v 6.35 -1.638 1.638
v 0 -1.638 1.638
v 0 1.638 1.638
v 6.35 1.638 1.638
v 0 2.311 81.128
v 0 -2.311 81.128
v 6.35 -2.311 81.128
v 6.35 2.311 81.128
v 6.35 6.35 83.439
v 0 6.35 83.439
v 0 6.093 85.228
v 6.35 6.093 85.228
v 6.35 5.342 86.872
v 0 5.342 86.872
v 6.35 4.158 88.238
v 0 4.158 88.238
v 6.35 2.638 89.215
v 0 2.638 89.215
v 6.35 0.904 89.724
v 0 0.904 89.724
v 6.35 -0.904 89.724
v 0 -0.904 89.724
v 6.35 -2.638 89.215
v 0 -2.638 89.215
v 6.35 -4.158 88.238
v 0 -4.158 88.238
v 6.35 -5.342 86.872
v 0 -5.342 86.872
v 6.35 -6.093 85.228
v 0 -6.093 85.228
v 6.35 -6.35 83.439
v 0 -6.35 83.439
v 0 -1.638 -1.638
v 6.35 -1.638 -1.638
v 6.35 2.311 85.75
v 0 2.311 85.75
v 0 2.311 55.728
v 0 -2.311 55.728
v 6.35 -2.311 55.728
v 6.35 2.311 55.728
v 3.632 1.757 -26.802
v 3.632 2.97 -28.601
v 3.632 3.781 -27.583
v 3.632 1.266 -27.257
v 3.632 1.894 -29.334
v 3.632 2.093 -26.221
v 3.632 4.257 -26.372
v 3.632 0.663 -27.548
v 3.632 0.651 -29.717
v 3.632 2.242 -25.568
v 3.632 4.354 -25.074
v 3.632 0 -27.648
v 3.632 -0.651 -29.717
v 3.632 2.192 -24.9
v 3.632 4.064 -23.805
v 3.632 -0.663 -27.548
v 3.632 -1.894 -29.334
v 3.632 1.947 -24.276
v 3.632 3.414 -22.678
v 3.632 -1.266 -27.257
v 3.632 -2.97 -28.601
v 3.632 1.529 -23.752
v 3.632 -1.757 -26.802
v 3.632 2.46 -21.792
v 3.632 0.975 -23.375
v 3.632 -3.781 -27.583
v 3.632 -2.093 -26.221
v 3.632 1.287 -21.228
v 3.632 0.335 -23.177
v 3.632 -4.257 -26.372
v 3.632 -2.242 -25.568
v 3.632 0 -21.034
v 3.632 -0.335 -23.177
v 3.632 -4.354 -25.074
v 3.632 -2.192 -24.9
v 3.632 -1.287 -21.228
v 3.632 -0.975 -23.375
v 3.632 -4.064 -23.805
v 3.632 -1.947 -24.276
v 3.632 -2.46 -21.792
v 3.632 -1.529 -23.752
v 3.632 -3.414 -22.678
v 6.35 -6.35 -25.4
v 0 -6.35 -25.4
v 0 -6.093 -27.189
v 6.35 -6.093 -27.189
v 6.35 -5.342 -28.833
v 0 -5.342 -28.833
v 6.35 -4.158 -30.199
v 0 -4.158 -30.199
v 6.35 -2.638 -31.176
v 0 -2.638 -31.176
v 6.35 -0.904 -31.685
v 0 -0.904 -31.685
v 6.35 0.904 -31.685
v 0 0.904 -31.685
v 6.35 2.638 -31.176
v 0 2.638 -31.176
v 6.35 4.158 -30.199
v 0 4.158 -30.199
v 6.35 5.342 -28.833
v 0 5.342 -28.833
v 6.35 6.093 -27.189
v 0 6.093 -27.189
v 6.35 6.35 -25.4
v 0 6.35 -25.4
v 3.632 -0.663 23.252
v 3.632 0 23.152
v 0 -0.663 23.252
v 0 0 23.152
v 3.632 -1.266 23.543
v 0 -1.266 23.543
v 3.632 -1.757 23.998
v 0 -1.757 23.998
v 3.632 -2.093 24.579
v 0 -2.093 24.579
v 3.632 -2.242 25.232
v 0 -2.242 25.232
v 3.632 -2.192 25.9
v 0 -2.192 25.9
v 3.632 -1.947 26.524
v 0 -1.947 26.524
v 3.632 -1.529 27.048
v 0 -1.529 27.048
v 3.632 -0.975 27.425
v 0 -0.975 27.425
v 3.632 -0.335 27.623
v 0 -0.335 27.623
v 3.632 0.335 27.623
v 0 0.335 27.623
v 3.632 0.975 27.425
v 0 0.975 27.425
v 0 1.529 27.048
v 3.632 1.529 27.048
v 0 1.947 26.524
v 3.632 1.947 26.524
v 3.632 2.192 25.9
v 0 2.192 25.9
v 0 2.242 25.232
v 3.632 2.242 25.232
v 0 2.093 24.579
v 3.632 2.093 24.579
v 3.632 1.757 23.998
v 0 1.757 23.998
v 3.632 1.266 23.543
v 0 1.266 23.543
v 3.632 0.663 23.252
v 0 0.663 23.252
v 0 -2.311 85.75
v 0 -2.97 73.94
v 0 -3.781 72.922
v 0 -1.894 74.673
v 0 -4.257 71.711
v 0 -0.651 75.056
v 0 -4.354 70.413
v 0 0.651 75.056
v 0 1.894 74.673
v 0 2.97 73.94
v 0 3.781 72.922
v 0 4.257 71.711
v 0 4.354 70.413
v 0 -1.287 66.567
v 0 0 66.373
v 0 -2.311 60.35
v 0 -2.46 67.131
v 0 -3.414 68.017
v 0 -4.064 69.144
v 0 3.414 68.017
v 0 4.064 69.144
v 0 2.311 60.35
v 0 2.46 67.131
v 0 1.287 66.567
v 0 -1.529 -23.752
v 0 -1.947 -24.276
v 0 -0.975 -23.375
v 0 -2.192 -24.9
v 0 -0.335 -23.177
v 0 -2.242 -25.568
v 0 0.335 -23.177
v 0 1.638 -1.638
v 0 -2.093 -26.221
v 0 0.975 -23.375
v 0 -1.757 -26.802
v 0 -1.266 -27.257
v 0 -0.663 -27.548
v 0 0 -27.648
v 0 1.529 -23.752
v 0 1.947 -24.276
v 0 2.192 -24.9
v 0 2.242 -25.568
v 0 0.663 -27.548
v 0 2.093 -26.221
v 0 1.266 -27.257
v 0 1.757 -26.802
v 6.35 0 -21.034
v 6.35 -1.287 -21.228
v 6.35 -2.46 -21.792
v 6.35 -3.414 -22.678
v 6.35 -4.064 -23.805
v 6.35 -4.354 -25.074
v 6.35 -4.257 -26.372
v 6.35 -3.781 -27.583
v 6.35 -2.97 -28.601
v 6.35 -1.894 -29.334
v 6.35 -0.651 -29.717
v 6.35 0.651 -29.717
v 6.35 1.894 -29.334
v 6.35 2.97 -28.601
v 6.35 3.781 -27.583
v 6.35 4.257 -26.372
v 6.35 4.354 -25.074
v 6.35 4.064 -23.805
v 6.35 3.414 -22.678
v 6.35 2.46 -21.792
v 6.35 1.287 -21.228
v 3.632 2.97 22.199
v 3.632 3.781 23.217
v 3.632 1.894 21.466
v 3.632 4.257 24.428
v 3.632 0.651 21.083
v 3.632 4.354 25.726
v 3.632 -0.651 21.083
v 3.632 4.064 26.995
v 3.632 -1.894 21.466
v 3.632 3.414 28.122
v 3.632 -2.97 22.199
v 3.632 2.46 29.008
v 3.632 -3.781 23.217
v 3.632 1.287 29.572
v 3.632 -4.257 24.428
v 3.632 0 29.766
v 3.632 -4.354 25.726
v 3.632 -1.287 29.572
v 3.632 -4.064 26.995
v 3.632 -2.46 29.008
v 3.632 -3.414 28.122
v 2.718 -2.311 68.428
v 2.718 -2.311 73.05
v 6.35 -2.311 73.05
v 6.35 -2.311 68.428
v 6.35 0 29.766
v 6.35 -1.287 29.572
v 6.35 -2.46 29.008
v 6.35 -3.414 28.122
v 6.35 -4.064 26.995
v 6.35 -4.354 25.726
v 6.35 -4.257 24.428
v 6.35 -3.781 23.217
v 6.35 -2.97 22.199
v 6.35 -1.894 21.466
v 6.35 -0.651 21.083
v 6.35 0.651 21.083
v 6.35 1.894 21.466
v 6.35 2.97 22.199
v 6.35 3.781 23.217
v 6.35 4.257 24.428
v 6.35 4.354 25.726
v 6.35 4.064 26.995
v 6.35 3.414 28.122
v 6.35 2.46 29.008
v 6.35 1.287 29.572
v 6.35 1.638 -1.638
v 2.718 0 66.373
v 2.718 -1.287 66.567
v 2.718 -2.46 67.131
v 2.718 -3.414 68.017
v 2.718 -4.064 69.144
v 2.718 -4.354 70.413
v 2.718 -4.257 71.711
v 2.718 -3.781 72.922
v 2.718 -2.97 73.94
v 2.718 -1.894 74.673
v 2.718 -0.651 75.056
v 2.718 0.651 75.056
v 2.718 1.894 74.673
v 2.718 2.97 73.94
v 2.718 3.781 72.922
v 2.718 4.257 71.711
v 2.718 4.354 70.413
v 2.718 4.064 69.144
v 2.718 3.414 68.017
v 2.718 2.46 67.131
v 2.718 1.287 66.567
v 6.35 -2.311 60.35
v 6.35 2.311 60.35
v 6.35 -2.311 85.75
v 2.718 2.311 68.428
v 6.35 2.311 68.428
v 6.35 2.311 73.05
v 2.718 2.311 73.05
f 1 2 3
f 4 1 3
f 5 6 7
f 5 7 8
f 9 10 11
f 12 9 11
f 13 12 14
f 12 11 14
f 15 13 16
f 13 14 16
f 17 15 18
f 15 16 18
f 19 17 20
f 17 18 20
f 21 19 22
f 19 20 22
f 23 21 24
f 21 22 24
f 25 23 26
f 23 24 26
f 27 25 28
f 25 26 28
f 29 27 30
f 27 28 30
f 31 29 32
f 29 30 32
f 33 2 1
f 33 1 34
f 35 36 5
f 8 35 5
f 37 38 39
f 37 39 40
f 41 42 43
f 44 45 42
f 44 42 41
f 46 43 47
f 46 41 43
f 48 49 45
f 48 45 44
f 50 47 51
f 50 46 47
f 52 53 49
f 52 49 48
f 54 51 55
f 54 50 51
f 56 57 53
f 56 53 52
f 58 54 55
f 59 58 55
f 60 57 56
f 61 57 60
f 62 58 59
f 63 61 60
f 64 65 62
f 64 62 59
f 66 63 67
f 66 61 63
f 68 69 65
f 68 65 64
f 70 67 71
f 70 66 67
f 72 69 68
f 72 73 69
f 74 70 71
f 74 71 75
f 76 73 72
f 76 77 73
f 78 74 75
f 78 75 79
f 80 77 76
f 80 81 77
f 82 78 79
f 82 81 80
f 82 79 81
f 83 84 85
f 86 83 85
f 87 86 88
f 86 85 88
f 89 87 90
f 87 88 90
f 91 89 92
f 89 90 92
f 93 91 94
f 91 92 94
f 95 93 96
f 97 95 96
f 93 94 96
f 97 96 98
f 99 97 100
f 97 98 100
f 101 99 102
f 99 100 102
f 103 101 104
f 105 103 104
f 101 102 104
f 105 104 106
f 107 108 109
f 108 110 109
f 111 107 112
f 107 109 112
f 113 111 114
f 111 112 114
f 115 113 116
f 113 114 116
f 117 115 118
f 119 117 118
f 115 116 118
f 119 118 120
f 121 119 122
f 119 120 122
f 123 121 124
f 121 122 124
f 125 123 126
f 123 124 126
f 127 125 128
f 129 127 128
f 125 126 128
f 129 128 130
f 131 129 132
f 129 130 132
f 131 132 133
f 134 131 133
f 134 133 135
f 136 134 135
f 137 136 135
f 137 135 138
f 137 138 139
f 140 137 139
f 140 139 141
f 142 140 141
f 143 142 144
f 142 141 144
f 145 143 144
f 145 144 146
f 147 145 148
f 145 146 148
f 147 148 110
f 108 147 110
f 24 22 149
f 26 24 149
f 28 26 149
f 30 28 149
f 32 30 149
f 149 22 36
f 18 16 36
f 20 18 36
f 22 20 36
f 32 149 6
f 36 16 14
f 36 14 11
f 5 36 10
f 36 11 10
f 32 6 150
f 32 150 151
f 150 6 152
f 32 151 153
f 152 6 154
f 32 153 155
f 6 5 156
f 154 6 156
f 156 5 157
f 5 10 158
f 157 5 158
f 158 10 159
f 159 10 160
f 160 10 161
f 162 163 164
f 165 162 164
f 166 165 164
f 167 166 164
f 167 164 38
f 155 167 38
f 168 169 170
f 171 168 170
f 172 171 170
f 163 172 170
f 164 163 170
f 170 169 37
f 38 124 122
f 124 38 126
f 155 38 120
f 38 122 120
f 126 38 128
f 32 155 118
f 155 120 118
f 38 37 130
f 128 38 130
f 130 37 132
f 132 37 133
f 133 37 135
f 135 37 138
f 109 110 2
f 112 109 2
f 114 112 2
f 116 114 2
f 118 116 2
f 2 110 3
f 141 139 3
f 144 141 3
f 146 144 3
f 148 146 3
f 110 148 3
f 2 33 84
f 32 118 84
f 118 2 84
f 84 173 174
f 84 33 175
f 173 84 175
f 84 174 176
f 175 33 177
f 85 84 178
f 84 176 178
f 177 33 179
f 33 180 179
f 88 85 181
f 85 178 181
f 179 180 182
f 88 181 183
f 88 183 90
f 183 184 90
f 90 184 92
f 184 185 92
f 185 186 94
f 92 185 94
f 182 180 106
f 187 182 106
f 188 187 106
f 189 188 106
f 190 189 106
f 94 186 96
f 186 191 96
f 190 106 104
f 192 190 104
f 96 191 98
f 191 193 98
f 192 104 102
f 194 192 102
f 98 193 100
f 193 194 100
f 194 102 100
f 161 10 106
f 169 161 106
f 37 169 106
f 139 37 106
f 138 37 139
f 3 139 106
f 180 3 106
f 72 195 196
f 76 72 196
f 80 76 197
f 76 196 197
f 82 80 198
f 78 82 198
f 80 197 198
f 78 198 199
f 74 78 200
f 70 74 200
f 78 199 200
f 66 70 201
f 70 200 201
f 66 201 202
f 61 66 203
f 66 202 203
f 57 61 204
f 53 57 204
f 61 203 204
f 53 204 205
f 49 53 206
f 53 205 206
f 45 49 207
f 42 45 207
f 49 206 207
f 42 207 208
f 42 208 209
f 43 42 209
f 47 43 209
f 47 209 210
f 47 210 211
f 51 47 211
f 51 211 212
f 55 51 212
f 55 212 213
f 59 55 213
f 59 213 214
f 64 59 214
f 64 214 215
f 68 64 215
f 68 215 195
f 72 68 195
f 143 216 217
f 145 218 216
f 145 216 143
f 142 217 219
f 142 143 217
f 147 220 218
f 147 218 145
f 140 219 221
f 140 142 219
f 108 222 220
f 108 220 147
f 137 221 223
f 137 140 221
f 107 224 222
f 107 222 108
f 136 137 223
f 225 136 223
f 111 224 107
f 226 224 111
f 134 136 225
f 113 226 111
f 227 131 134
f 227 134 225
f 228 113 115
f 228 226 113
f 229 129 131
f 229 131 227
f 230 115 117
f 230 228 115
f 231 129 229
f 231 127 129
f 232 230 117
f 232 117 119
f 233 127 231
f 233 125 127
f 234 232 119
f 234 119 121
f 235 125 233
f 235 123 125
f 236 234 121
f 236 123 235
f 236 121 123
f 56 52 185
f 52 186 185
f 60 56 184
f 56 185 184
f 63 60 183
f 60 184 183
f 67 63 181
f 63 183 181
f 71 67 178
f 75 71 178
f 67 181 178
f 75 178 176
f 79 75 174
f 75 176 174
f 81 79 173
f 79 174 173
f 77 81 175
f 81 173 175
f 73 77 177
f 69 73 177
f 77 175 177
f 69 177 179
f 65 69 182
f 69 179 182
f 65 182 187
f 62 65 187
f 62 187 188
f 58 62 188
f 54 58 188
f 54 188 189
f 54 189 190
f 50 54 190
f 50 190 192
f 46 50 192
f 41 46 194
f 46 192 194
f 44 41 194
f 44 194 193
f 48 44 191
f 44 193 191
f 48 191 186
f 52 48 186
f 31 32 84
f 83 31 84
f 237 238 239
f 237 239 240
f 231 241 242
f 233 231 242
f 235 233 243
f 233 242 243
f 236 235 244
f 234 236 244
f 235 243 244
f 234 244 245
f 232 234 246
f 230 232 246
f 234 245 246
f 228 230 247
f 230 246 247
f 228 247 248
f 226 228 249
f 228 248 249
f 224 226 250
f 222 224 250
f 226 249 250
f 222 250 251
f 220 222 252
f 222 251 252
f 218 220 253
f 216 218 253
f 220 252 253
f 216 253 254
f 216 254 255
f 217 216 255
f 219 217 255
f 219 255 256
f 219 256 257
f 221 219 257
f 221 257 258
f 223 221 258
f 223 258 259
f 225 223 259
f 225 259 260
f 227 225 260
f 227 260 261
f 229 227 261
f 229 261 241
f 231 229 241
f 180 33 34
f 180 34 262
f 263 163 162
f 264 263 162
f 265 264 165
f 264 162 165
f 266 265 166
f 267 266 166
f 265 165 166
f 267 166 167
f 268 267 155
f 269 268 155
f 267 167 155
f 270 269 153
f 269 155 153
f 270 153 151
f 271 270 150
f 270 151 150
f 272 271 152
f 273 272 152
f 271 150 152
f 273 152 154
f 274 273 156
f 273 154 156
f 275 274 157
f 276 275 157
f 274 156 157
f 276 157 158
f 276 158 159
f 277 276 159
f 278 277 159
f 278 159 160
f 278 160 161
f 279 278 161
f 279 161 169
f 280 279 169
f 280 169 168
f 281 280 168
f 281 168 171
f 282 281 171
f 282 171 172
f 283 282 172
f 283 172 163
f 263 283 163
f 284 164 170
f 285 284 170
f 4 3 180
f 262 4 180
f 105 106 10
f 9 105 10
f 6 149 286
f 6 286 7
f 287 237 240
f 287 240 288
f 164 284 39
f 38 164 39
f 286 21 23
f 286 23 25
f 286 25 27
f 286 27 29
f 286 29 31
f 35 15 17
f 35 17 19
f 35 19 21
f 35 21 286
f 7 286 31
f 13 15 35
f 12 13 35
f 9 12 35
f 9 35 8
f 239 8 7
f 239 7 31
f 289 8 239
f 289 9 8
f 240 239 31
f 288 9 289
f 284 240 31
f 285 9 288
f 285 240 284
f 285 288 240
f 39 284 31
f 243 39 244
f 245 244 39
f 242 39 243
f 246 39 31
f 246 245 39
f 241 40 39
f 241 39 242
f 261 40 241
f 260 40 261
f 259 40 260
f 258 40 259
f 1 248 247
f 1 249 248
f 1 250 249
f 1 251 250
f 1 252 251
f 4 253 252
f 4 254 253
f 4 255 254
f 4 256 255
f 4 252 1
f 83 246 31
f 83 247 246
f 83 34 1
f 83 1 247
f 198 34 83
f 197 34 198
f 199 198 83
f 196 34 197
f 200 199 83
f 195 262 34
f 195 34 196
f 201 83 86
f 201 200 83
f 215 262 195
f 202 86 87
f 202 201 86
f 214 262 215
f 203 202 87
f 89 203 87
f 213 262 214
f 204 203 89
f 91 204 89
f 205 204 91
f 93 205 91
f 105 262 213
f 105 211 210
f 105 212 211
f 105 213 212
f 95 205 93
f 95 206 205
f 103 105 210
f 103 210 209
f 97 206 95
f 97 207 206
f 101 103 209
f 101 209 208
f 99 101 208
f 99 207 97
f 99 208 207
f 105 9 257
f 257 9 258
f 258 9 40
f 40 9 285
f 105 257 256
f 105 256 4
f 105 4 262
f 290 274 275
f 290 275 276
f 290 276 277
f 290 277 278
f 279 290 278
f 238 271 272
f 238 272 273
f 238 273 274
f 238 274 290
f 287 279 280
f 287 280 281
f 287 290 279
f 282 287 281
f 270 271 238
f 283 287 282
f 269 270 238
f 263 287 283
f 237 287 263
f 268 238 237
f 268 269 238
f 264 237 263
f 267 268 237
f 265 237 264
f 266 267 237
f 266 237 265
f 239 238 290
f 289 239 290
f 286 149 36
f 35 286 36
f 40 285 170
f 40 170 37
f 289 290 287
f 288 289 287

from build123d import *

# Parameters (mm, degrees)
SKETCH1_W                                      = 3.275
SKETCH1_H                                      = 3.275
SKETCH1_W_2                                    = 4.6228
SKETCH1_H_2                                    = 4.6228
BOSS_EXTRUDE1_DEPTH                            = 6.35
CBORE_FOR_8_BUTTON_HEAD_CAP_SCREW1_D           = 4.4958
CBORE_FOR_8_BUTTON_HEAD_CAP_SCREW1_CBORE_D     = 8.73252
CBORE_FOR_8_BUTTON_HEAD_CAP_SCREW1_CBORE_DEPTH = 2.7178
CBORE_FOR_8_BUTTON_HEAD_CAP_SCREW2_D           = 4.4958
CBORE_FOR_8_BUTTON_HEAD_CAP_SCREW2_CBORE_D     = 8.73252
CBORE_FOR_8_BUTTON_HEAD_CAP_SCREW2_CBORE_DEPTH = 2.7178


with BuildPart() as part:
    # Sketch1 → Boss-Extrude1 (new body)
    with BuildSketch(Plane(origin=(0, 0, 0), x_dir=(0, 0, -1), z_dir=(1, 0, 0))):
        with BuildLine():
            Line((-83.439, -6.35), (25.4, -6.35))
            ThreePointArc((25.4, -6.35), (31.75, 0), (25.4, 6.35))
            Line((25.4, 6.35), (-83.439, 6.35))
            ThreePointArc((-83.439, 6.35), (-89.789, 0), (-83.439, -6.35))
        make_face()
        Rectangle(SKETCH1_W, SKETCH1_H, mode=Mode.SUBTRACT)
        with Locations((-83.439, 0)):
            Rectangle(SKETCH1_W_2, SKETCH1_H_2, mode=Mode.SUBTRACT)
        with Locations((-58.039, 0)):
            Rectangle(SKETCH1_W_2, SKETCH1_H_2, mode=Mode.SUBTRACT)
        with Locations((-70.739, 0)):
            Rectangle(SKETCH1_W_2, SKETCH1_H_2, mode=Mode.SUBTRACT)
    extrude(amount=BOSS_EXTRUDE1_DEPTH)

    # CBORE for #8 Button Head Cap Screw1 (through all)
    with Locations(Plane(origin=(6.35, 0, 25.4), x_dir=(0, 0, 1), z_dir=(1, 0, 0))):
        with Locations((0, 0), (-50.8, 0)):
            CounterBoreHole(CBORE_FOR_8_BUTTON_HEAD_CAP_SCREW1_D / 2, CBORE_FOR_8_BUTTON_HEAD_CAP_SCREW1_CBORE_D / 2, CBORE_FOR_8_BUTTON_HEAD_CAP_SCREW1_CBORE_DEPTH)

    # CBORE for #8 Button Head Cap Screw2 (through all)
    with Locations(Plane(origin=(0, 0, 70.739), x_dir=(0, 0, -1), z_dir=(-1, 0, 0))):
        with Locations((0, 0)):
            CounterBoreHole(CBORE_FOR_8_BUTTON_HEAD_CAP_SCREW2_D / 2, CBORE_FOR_8_BUTTON_HEAD_CAP_SCREW2_CBORE_D / 2, CBORE_FOR_8_BUTTON_HEAD_CAP_SCREW2_CBORE_DEPTH)


solid = part.part
